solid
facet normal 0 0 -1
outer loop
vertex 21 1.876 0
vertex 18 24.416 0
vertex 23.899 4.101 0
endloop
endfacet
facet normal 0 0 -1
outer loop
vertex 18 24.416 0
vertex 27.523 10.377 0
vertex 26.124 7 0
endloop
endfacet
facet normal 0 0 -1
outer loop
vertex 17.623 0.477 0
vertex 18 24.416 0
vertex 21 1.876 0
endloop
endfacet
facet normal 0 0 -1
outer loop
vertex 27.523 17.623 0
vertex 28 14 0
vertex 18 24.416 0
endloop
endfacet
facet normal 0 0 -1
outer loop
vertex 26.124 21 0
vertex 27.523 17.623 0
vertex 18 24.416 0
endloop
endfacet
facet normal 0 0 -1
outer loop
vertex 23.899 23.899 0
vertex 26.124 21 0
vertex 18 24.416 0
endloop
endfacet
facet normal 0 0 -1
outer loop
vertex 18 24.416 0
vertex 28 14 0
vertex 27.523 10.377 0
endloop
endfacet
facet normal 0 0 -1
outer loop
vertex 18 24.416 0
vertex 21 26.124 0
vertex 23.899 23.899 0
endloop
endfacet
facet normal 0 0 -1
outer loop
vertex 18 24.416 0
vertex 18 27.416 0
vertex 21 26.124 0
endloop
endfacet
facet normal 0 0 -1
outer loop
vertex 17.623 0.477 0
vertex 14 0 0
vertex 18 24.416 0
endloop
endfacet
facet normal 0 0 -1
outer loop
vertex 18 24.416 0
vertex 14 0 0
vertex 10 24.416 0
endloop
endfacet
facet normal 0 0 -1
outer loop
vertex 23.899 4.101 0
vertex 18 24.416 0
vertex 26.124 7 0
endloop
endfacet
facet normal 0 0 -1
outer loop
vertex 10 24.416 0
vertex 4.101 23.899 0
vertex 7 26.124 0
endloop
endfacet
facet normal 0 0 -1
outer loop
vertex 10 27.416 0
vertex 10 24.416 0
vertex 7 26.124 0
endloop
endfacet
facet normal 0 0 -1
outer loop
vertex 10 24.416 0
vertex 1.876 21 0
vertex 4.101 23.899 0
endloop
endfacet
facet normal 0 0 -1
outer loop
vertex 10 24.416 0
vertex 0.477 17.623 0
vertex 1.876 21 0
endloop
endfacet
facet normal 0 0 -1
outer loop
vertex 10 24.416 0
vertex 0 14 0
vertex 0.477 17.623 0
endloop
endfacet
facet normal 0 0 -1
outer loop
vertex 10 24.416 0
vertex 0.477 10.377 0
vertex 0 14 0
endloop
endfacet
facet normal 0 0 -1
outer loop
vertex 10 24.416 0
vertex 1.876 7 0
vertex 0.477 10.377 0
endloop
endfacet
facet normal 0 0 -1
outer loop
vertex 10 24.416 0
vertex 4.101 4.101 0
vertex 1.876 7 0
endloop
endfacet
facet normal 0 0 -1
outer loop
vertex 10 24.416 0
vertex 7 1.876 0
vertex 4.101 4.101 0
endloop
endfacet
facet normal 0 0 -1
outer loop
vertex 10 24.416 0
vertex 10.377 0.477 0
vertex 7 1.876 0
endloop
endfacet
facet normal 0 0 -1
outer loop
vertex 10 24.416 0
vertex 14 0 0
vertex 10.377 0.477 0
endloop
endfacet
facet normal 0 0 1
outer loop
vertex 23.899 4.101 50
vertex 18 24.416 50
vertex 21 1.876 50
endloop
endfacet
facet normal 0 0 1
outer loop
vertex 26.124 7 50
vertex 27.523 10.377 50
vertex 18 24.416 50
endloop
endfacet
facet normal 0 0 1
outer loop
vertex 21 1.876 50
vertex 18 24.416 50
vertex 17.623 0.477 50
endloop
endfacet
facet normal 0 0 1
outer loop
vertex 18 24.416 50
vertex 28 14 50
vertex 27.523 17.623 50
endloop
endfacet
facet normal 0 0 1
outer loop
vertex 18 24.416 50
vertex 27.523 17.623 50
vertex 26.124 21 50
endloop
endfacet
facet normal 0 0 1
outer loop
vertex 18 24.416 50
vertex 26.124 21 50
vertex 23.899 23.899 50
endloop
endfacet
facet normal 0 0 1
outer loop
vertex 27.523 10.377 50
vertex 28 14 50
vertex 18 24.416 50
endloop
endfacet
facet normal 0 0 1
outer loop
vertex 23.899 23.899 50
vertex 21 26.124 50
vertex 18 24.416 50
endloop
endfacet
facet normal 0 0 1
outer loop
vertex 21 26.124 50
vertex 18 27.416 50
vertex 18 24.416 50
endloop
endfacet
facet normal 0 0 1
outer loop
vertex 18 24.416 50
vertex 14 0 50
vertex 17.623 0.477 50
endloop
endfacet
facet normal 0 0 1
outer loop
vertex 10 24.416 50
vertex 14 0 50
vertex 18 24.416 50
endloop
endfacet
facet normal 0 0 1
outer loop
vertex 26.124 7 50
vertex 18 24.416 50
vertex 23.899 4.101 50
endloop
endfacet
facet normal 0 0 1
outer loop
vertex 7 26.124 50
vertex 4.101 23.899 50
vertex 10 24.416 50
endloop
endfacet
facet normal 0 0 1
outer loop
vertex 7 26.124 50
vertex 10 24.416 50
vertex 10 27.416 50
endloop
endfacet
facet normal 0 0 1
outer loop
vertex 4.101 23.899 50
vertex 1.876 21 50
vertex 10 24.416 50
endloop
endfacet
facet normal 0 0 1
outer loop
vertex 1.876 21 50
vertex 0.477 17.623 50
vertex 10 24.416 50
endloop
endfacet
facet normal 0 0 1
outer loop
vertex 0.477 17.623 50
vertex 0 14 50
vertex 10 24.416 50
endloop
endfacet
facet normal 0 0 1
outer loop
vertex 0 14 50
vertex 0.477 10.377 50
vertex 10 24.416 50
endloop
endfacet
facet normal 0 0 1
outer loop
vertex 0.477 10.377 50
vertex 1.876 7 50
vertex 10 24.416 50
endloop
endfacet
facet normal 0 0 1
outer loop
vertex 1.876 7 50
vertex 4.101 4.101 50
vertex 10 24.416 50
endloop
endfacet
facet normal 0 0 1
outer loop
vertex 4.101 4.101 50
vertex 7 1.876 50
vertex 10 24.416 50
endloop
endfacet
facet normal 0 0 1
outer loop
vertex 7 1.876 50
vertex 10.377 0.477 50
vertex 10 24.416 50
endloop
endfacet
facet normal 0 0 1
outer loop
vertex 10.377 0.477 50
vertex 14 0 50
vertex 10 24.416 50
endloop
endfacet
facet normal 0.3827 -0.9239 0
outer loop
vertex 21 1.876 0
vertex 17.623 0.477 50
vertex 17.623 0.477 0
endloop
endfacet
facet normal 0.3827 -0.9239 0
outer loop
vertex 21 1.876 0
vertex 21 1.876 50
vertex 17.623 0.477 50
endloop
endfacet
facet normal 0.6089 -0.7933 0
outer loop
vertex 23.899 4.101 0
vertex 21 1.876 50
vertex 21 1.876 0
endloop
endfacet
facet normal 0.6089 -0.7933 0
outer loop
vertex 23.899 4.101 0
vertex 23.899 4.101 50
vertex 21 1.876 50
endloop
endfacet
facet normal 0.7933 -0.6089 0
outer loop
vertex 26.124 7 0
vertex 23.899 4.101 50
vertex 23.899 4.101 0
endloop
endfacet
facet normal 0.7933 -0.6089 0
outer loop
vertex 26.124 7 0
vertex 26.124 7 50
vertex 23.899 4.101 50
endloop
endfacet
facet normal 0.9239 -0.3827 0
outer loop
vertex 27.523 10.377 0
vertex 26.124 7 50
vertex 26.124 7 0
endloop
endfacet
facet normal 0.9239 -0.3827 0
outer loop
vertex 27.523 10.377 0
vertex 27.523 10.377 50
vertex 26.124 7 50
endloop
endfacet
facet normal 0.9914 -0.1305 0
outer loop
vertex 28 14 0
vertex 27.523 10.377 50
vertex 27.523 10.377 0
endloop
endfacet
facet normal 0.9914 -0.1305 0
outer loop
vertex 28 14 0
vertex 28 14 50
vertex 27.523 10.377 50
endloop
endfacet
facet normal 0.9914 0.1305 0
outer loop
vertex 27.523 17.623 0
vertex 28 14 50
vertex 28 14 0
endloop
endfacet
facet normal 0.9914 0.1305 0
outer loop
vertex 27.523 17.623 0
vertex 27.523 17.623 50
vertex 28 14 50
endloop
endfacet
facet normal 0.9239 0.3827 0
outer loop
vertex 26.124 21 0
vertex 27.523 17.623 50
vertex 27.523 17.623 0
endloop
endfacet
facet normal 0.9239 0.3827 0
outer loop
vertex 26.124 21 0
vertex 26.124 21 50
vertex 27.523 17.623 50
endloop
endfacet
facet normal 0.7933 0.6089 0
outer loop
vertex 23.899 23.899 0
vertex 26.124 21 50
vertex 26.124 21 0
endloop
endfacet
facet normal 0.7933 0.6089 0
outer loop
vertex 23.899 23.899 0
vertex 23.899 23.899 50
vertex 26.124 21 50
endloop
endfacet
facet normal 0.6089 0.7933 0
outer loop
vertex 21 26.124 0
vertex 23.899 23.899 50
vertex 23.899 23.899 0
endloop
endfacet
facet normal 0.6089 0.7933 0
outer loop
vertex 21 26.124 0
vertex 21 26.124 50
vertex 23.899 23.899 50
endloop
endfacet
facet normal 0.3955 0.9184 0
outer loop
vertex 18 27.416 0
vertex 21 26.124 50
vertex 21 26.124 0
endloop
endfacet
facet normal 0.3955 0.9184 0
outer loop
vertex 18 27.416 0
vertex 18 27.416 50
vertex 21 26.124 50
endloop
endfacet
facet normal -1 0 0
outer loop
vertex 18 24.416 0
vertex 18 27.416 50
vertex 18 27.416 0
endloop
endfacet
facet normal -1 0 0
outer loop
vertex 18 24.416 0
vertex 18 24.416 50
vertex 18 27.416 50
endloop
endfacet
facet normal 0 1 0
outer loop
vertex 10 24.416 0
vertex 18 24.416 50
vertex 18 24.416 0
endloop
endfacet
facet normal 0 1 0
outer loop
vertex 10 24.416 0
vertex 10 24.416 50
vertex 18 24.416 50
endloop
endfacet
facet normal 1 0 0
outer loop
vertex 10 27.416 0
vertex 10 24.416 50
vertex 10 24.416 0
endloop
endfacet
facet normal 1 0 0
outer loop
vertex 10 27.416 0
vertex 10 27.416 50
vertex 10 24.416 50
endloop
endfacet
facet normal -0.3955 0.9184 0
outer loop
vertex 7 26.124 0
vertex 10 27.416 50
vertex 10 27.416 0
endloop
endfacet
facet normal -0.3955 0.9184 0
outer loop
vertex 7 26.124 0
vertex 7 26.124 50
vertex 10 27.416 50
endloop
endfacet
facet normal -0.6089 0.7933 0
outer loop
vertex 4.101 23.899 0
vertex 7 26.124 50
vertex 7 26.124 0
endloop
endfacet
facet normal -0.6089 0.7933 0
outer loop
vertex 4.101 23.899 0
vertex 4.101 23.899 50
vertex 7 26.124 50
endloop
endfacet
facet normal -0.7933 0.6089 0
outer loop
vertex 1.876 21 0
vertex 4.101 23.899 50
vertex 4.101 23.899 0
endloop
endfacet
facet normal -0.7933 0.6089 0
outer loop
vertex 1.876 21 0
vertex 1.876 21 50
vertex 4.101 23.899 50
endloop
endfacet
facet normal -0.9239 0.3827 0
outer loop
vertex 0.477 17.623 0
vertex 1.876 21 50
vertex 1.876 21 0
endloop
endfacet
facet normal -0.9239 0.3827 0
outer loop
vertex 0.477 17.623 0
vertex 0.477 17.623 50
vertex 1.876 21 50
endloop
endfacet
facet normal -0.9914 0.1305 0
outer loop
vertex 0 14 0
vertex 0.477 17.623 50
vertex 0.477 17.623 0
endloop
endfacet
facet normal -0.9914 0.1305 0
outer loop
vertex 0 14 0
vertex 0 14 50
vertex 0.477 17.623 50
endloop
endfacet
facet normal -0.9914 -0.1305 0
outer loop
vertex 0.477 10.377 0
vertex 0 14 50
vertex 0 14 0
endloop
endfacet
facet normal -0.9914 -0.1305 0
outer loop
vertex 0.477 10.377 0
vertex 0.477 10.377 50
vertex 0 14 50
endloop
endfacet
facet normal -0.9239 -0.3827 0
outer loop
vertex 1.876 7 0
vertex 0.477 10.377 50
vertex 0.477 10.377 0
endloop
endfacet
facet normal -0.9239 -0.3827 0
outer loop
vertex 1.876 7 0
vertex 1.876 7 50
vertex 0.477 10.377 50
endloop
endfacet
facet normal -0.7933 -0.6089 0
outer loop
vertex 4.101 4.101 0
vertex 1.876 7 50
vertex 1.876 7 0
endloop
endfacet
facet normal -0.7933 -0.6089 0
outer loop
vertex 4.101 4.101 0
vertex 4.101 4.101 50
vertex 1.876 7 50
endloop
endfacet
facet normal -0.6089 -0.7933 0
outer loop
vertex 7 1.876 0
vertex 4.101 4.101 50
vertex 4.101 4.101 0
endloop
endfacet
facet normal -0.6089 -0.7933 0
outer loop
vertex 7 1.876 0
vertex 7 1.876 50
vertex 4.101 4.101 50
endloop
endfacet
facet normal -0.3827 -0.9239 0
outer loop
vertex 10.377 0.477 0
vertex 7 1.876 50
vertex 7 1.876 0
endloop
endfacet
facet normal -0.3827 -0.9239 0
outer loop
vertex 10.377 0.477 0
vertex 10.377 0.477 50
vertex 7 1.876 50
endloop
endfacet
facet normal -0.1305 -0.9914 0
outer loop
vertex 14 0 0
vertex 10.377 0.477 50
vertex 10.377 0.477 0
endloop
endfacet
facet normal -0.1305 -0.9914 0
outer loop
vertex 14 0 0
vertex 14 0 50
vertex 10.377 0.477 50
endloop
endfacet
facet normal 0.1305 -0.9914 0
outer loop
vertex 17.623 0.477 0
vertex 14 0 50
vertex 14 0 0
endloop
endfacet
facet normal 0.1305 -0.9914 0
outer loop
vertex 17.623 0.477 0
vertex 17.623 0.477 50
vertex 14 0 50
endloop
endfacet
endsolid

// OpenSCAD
$fn = 32;

// ----------------------------------------------------------------------
// Keyway shaft: d28 shaft, key 8 x 3 mm
// ----------------------------------------------------------------------

// --- parameters (mm) ---
shaft_r = 14;             // shaft radius
key_w = 8;                // keyway width
key_d = 3;                // keyway depth below the surface line
plate_t = 50;             // shaft length, Z (extrusion height)

shaft_d = 2 * shaft_r;  // shaft diameter
circle_step = 15;  // polygon sampling step, degrees

profile = [[7, 26.124], [4.101, 23.899], [1.876, 21], [0.477, 17.623], [0, 14], [0.477, 10.377], [1.876, 7], [4.101, 4.101], [7, 1.876], [10.377, 0.477], [14, 0], [17.623, 0.477], [21, 1.876], [23.899, 4.101], [26.124, 7], [27.523, 10.377], [28, 14], [27.523, 17.623], [26.124, 21], [23.899, 23.899], [21, 26.124], [18, 27.416], [18, 24.416], [10, 24.416], [10, 27.416]];  // primary outline, 25 points, counter clockwise

// --- the one profile operation ---
linear_extrude(height = plate_t) polygon(points = profile);
